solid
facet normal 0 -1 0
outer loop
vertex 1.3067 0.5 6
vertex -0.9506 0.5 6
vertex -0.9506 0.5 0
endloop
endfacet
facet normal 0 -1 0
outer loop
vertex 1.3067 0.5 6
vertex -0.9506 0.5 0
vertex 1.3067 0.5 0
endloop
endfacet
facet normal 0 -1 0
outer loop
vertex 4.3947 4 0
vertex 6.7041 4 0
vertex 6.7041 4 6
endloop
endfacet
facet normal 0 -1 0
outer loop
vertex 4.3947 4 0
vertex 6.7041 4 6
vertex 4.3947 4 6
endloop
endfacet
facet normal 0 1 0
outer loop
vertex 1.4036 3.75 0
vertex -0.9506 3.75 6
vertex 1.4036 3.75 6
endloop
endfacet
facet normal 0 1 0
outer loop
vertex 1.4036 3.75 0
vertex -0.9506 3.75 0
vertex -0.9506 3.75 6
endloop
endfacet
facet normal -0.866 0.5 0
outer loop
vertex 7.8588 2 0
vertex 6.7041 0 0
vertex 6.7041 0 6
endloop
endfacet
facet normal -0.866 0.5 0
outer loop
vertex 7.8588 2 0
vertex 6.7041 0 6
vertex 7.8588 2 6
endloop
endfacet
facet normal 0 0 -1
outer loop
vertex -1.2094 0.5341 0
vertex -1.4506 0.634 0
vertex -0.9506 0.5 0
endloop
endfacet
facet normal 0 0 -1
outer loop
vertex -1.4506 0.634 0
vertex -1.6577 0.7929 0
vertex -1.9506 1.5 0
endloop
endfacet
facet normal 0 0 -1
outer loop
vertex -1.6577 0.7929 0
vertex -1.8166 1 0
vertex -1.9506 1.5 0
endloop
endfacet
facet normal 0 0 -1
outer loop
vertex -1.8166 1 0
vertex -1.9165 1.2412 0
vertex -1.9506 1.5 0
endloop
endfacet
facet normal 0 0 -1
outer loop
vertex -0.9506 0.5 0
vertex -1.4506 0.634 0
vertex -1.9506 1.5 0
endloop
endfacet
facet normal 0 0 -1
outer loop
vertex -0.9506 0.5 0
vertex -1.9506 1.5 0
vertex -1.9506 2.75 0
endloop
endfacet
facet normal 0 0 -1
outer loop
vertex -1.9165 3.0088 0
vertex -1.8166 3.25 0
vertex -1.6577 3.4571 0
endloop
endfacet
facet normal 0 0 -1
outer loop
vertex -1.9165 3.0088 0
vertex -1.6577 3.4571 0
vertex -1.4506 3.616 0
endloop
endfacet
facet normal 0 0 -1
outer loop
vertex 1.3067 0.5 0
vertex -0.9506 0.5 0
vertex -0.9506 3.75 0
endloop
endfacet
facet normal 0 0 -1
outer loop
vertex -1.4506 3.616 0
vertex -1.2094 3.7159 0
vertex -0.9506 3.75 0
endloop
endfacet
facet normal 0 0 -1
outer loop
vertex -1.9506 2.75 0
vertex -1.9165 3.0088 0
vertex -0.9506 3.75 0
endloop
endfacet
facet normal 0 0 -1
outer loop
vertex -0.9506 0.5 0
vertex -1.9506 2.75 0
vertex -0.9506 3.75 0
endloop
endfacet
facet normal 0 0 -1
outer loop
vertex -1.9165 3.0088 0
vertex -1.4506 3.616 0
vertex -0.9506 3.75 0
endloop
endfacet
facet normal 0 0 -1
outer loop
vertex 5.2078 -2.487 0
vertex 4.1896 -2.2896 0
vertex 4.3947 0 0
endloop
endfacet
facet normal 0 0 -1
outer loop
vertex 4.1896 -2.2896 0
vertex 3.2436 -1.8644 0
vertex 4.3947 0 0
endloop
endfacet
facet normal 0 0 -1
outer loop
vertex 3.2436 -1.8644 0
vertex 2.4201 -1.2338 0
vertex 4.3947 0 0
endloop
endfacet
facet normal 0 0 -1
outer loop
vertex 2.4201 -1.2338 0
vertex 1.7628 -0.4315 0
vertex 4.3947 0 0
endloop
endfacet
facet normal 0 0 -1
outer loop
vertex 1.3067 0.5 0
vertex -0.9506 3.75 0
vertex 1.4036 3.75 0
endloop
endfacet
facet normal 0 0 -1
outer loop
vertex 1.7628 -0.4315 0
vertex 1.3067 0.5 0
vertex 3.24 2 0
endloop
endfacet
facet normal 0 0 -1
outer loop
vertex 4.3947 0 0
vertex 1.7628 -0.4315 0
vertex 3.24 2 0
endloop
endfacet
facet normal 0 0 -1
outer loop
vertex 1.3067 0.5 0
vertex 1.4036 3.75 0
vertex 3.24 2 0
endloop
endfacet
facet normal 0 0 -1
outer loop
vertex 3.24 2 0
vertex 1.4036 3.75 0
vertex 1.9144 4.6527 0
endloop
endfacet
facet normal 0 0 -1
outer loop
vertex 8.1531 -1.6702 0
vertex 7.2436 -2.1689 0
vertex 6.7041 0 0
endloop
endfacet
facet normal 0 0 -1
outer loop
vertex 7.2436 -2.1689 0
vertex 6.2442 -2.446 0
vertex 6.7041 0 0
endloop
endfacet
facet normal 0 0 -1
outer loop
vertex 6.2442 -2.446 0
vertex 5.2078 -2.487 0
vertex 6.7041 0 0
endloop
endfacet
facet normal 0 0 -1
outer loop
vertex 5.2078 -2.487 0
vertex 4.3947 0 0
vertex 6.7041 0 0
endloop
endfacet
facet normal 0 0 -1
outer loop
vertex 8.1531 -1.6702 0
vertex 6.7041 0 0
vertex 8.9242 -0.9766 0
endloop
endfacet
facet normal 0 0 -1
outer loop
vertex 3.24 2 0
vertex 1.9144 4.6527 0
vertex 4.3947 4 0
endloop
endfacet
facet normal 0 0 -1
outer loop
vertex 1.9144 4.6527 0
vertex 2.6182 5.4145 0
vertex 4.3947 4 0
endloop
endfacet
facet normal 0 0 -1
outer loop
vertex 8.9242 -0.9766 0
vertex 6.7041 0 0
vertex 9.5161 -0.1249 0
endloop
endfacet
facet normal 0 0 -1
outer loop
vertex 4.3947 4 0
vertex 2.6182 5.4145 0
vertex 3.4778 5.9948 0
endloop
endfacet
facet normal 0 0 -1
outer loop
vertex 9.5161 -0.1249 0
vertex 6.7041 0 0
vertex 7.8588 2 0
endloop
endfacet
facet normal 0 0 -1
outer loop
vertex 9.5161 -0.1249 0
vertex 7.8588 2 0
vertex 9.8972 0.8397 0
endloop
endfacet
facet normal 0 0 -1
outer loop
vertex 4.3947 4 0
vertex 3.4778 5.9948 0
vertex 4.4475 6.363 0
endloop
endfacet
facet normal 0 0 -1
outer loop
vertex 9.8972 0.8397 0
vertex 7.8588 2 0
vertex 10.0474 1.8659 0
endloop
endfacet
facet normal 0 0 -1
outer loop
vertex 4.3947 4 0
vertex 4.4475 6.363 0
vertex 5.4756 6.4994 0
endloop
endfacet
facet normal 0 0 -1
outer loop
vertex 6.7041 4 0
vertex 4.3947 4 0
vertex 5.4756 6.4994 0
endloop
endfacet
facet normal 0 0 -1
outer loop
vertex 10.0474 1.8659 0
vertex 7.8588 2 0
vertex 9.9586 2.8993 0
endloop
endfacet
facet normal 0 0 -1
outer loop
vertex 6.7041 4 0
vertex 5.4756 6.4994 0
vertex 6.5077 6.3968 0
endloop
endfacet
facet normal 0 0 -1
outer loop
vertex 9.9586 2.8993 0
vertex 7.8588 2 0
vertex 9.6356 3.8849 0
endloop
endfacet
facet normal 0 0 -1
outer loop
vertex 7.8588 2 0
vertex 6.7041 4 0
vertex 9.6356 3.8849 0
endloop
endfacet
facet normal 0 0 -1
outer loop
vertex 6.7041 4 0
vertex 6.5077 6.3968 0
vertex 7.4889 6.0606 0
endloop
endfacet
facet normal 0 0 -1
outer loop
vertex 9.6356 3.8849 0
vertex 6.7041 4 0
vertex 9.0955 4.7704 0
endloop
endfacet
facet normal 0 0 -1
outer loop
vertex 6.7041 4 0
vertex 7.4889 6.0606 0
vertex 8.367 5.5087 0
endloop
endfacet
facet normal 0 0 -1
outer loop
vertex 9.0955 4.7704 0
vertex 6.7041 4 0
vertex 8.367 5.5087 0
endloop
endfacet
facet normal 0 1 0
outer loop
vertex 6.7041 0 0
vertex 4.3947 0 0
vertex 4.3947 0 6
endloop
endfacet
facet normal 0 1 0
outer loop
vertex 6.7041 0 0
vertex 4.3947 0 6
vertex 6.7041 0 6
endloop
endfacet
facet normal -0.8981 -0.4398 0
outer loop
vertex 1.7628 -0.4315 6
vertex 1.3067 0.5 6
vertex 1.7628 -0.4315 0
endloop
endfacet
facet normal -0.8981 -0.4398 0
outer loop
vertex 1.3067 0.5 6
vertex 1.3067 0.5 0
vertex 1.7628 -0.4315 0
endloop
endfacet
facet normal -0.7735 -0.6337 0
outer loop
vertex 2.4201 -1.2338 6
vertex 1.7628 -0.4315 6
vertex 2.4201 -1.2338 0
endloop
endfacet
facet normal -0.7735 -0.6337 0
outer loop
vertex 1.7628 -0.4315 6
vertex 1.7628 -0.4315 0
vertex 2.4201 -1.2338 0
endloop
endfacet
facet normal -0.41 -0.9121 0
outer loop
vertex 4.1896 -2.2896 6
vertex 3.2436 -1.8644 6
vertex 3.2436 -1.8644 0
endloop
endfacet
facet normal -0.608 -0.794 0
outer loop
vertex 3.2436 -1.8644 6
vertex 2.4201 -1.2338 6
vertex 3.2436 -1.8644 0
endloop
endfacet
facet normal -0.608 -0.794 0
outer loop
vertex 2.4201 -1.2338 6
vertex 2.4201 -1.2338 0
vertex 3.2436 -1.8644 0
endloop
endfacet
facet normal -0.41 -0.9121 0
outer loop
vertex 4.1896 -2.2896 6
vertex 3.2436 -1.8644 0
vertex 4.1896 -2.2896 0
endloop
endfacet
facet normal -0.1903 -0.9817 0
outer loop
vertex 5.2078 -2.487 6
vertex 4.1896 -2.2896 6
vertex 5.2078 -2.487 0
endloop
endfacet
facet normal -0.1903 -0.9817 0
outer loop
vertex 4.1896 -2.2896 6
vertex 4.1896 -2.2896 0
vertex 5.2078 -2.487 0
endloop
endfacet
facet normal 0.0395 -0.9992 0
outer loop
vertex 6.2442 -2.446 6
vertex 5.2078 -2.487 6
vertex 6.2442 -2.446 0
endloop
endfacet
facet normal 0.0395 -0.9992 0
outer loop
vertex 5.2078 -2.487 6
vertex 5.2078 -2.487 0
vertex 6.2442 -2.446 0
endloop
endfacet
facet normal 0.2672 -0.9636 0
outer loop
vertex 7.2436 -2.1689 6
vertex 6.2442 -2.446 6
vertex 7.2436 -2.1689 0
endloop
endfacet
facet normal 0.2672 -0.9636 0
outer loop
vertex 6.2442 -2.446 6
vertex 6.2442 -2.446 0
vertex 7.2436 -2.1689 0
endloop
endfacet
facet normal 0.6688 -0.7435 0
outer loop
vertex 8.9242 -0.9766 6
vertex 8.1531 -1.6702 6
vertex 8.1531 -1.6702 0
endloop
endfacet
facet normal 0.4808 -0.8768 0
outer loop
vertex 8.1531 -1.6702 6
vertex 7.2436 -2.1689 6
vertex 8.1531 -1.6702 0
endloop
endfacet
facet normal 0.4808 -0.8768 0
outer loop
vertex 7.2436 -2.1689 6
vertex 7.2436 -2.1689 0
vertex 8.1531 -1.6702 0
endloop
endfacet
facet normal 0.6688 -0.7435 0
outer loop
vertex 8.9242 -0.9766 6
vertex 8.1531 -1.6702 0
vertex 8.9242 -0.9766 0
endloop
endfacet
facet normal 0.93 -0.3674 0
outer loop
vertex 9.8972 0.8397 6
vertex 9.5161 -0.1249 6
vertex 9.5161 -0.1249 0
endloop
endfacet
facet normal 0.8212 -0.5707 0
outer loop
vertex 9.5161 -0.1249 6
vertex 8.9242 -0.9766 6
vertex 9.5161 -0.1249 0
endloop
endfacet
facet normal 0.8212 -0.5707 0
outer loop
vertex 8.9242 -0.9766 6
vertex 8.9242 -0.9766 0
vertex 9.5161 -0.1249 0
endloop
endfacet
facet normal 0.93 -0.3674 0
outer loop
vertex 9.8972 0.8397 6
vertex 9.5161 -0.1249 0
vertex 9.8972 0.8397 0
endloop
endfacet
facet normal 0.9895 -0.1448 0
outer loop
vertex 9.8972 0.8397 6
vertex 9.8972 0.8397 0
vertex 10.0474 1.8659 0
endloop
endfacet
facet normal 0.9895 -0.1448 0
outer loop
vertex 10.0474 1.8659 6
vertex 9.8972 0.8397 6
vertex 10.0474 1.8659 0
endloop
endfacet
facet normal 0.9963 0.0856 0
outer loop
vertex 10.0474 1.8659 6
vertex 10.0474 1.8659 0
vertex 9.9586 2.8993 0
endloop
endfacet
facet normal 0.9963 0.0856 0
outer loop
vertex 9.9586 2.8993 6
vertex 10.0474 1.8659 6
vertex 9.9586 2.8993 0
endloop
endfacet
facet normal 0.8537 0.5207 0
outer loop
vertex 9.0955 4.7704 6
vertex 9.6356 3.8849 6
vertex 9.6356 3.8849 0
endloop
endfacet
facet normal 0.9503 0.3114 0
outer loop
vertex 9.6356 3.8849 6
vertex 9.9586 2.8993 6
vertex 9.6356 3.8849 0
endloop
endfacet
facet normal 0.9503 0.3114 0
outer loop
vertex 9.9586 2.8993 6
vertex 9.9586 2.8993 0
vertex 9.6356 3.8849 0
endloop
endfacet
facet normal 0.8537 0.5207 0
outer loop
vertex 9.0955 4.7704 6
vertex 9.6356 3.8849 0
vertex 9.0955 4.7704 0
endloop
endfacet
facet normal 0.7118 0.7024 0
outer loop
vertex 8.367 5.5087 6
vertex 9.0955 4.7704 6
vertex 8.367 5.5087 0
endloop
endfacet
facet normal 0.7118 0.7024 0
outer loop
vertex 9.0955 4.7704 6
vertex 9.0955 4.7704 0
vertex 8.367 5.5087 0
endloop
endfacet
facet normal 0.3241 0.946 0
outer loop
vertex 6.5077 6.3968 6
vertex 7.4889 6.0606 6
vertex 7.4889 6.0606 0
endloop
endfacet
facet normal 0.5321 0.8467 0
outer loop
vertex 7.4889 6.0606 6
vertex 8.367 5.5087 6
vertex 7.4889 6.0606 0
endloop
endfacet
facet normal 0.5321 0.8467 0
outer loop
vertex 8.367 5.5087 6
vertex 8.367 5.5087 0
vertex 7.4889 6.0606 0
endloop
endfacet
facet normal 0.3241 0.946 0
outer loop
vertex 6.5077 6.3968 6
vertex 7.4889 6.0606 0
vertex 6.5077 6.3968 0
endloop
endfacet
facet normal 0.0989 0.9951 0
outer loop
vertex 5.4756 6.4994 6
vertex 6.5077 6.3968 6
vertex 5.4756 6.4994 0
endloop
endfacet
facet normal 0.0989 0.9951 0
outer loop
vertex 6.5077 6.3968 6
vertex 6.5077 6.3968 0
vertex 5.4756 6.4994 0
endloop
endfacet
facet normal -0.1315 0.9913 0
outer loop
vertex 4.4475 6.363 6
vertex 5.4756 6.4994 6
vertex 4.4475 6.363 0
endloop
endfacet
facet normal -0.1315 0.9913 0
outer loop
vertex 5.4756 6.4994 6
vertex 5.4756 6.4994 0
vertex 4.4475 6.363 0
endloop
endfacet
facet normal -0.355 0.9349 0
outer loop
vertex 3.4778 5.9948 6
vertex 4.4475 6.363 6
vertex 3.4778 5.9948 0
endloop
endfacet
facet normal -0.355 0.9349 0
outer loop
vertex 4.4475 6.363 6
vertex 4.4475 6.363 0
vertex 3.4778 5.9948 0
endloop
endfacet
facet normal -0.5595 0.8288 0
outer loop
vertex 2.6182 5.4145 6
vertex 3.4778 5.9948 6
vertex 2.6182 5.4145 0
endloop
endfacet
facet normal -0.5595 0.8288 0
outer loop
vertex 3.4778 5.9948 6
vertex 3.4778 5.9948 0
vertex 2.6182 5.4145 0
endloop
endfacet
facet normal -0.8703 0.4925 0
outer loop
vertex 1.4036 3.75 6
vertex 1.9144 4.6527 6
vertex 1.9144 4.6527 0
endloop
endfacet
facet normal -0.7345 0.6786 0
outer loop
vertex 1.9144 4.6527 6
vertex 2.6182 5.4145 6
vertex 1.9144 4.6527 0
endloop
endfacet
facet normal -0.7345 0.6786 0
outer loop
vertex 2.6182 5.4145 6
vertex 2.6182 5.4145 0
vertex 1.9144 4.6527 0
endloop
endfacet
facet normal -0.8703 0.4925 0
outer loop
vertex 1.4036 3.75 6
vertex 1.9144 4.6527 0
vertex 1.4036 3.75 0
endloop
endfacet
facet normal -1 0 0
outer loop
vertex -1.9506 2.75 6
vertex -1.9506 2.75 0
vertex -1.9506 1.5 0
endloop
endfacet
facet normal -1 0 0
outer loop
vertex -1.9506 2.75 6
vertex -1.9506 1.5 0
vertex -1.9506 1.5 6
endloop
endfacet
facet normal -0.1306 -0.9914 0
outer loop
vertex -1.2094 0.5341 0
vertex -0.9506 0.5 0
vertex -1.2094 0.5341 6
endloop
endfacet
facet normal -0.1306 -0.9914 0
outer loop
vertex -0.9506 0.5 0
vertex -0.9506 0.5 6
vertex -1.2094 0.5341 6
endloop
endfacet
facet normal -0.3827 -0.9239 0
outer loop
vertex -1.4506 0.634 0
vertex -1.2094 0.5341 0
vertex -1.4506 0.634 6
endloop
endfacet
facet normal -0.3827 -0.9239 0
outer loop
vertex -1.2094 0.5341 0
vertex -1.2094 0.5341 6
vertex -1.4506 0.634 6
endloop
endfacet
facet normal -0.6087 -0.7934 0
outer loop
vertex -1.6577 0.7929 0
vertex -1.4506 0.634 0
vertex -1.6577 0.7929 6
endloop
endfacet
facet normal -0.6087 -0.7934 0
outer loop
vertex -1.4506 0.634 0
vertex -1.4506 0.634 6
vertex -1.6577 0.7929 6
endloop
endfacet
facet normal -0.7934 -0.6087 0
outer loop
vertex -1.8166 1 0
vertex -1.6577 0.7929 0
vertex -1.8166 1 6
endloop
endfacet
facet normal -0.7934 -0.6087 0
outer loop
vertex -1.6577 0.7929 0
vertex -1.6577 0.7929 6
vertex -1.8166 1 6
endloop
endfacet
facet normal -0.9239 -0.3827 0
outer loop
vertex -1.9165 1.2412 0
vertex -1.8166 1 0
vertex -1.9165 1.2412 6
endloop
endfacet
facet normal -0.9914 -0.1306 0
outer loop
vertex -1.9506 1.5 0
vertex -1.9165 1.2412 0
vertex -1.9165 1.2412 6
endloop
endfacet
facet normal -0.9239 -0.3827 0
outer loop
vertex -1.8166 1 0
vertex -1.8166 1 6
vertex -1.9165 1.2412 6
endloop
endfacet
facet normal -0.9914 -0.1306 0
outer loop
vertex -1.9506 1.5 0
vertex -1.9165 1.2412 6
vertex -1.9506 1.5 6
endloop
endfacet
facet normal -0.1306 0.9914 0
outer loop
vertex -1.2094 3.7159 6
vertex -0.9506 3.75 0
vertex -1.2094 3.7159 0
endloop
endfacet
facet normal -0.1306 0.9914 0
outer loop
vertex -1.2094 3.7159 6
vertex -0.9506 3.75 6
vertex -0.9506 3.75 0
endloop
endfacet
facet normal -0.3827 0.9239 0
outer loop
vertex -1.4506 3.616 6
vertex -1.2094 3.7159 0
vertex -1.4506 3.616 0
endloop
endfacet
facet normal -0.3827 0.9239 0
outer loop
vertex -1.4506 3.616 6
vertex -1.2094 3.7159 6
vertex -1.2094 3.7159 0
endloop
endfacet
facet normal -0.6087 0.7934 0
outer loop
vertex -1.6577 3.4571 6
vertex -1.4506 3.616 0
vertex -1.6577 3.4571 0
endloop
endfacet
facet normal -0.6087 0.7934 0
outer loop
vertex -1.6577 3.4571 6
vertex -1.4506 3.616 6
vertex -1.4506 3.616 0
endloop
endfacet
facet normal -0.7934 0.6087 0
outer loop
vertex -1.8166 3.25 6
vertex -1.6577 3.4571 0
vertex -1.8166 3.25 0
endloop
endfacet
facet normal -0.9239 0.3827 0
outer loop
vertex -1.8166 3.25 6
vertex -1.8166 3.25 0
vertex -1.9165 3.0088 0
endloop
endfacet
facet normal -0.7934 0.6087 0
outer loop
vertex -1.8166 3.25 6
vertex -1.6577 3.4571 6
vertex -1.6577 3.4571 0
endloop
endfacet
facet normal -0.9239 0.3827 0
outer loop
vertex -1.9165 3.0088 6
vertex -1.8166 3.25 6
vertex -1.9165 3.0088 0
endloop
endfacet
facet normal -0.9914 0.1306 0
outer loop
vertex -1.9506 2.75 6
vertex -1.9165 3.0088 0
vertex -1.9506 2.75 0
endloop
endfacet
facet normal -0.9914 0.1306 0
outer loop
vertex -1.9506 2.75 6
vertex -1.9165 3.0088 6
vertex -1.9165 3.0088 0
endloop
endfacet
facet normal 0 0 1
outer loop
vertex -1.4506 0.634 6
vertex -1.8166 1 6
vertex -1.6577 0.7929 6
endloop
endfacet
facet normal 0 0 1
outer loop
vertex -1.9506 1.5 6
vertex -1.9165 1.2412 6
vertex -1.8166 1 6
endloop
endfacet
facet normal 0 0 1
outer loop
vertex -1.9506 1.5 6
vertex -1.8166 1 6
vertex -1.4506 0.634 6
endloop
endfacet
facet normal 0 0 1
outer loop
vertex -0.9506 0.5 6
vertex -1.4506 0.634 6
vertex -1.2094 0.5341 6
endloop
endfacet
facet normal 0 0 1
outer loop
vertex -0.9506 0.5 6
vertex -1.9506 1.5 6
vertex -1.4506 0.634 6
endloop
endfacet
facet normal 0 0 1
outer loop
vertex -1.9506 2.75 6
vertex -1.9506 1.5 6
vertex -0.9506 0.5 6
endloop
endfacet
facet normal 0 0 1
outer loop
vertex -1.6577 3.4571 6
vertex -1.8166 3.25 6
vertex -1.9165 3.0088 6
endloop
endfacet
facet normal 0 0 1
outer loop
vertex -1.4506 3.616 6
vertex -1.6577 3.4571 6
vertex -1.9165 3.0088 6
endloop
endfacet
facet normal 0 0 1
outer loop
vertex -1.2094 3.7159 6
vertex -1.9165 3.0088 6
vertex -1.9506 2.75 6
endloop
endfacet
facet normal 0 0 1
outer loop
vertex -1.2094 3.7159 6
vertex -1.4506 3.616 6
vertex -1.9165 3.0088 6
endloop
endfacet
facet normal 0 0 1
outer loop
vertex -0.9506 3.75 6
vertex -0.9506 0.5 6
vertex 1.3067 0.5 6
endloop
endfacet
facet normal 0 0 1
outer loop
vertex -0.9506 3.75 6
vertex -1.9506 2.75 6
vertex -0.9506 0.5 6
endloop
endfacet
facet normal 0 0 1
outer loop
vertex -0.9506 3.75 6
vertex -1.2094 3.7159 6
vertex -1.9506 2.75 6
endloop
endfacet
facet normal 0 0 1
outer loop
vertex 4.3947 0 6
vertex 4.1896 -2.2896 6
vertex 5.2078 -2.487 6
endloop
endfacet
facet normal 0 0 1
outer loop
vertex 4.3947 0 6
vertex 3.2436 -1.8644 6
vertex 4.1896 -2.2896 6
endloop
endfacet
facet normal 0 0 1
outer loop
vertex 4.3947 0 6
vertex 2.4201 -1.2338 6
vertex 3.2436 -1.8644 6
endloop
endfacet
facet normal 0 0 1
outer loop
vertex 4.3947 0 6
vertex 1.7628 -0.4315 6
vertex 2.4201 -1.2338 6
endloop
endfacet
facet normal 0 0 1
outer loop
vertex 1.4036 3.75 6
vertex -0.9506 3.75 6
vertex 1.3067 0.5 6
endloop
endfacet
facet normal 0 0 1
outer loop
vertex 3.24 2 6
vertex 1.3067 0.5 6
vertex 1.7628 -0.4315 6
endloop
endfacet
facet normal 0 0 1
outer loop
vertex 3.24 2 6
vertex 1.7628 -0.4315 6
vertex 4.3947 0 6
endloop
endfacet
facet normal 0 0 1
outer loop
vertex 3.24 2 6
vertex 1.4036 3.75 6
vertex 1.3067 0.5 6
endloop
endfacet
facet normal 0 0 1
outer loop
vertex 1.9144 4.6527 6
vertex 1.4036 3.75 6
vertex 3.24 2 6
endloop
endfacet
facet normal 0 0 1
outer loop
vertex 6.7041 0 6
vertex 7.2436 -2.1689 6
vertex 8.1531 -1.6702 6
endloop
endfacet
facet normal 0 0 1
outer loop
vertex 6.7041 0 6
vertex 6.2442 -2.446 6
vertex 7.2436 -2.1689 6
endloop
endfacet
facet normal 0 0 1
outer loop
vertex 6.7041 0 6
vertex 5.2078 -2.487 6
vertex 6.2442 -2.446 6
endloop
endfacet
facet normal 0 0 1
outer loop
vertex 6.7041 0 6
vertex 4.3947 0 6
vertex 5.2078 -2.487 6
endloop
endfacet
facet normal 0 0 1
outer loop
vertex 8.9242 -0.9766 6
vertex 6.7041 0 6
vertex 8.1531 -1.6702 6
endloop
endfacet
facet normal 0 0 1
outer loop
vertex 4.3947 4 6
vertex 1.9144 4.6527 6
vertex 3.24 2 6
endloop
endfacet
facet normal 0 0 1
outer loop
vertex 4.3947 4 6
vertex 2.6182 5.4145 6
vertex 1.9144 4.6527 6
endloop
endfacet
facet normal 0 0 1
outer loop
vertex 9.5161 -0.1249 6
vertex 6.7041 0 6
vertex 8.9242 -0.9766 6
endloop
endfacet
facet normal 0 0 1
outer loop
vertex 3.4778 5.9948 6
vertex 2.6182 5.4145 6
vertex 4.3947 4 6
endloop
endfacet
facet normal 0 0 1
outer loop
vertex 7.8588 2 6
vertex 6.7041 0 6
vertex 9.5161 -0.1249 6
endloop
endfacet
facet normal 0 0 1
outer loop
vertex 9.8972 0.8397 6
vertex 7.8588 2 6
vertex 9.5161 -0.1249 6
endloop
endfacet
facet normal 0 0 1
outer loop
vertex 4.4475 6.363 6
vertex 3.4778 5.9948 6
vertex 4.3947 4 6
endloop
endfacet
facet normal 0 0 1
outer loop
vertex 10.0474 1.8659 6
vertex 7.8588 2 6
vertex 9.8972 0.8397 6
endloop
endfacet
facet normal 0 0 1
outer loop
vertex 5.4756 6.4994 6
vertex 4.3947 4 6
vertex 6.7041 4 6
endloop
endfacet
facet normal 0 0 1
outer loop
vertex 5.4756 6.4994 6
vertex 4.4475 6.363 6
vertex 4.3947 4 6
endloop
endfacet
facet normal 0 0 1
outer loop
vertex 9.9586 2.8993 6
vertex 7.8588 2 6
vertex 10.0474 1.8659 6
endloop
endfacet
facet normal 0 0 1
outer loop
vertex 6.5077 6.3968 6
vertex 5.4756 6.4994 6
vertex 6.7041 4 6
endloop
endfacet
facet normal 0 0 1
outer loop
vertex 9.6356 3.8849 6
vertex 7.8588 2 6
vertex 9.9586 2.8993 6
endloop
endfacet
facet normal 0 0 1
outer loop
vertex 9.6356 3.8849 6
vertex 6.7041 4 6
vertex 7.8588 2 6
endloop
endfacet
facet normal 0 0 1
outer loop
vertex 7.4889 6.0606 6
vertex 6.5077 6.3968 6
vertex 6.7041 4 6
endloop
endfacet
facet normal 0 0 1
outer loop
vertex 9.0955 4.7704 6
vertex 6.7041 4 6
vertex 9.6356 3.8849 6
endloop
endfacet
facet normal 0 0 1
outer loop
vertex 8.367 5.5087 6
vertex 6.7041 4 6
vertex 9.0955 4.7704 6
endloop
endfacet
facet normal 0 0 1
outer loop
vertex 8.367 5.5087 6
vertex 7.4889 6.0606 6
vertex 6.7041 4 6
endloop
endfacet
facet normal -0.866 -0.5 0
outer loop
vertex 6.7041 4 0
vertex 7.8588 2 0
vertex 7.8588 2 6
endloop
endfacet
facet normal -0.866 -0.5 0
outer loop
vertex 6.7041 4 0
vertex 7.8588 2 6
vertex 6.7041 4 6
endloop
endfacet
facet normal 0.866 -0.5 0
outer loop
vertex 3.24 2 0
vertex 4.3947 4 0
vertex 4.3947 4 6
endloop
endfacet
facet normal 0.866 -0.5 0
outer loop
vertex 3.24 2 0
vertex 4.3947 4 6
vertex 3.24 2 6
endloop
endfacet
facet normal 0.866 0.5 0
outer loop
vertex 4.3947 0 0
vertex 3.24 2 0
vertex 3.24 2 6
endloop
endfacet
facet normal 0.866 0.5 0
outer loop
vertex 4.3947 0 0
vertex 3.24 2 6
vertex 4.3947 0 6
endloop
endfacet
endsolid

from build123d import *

# Parameters (mm, degrees)
SKETCH1_R                = 4.5
BOSS_EXTRUDE1_DEPTH      = 6
BOSS_EXTRUDE2_DEPTH      = 1.75
BOSS_EXTRUDE2_DEPTH_BACK = 1.5
FILLET1_R                = 1


with BuildPart() as part:
    # Sketch1 → Boss-Extrude1 (new body)
    with BuildSketch(Plane.XY):
        with Locations((5.549376682, 2)):
            Circle(SKETCH1_R)
        Polygon((4.394676144, 0), (6.704077221, 0), (7.858777759, 2), (6.704077221, 4), (4.394676144, 4), (3.239975606, 2), align=None, mode=Mode.SUBTRACT)
    extrude(amount=BOSS_EXTRUDE1_DEPTH)

    # Sketch2 → Boss-Extrude2 (add, two sides)
    with BuildSketch(Plane(origin=(0, 2, 0), x_dir=(1, 0, 0), z_dir=(0, 1, 0))) as boss_extrude2_sk:
        Polygon((3.239975606, 0), (1.049376682, 0), (-1.950623318, 0), (-1.950623318, -6), (1.049376682, -6), (3.239975606, -6), align=None)
    extrude(amount=BOSS_EXTRUDE2_DEPTH)
    extrude(boss_extrude2_sk.sketch, amount=-BOSS_EXTRUDE2_DEPTH_BACK)

    # Fillet1
    fillet1_edges = [part.edges().sort_by_distance(p)[0] for p in [
        (-1.950623318, 3.75, 3),
        (-1.950623318, 0.5, 3),
    ]]
    fillet(fillet1_edges, radius=FILLET1_R)


solid = part.part
